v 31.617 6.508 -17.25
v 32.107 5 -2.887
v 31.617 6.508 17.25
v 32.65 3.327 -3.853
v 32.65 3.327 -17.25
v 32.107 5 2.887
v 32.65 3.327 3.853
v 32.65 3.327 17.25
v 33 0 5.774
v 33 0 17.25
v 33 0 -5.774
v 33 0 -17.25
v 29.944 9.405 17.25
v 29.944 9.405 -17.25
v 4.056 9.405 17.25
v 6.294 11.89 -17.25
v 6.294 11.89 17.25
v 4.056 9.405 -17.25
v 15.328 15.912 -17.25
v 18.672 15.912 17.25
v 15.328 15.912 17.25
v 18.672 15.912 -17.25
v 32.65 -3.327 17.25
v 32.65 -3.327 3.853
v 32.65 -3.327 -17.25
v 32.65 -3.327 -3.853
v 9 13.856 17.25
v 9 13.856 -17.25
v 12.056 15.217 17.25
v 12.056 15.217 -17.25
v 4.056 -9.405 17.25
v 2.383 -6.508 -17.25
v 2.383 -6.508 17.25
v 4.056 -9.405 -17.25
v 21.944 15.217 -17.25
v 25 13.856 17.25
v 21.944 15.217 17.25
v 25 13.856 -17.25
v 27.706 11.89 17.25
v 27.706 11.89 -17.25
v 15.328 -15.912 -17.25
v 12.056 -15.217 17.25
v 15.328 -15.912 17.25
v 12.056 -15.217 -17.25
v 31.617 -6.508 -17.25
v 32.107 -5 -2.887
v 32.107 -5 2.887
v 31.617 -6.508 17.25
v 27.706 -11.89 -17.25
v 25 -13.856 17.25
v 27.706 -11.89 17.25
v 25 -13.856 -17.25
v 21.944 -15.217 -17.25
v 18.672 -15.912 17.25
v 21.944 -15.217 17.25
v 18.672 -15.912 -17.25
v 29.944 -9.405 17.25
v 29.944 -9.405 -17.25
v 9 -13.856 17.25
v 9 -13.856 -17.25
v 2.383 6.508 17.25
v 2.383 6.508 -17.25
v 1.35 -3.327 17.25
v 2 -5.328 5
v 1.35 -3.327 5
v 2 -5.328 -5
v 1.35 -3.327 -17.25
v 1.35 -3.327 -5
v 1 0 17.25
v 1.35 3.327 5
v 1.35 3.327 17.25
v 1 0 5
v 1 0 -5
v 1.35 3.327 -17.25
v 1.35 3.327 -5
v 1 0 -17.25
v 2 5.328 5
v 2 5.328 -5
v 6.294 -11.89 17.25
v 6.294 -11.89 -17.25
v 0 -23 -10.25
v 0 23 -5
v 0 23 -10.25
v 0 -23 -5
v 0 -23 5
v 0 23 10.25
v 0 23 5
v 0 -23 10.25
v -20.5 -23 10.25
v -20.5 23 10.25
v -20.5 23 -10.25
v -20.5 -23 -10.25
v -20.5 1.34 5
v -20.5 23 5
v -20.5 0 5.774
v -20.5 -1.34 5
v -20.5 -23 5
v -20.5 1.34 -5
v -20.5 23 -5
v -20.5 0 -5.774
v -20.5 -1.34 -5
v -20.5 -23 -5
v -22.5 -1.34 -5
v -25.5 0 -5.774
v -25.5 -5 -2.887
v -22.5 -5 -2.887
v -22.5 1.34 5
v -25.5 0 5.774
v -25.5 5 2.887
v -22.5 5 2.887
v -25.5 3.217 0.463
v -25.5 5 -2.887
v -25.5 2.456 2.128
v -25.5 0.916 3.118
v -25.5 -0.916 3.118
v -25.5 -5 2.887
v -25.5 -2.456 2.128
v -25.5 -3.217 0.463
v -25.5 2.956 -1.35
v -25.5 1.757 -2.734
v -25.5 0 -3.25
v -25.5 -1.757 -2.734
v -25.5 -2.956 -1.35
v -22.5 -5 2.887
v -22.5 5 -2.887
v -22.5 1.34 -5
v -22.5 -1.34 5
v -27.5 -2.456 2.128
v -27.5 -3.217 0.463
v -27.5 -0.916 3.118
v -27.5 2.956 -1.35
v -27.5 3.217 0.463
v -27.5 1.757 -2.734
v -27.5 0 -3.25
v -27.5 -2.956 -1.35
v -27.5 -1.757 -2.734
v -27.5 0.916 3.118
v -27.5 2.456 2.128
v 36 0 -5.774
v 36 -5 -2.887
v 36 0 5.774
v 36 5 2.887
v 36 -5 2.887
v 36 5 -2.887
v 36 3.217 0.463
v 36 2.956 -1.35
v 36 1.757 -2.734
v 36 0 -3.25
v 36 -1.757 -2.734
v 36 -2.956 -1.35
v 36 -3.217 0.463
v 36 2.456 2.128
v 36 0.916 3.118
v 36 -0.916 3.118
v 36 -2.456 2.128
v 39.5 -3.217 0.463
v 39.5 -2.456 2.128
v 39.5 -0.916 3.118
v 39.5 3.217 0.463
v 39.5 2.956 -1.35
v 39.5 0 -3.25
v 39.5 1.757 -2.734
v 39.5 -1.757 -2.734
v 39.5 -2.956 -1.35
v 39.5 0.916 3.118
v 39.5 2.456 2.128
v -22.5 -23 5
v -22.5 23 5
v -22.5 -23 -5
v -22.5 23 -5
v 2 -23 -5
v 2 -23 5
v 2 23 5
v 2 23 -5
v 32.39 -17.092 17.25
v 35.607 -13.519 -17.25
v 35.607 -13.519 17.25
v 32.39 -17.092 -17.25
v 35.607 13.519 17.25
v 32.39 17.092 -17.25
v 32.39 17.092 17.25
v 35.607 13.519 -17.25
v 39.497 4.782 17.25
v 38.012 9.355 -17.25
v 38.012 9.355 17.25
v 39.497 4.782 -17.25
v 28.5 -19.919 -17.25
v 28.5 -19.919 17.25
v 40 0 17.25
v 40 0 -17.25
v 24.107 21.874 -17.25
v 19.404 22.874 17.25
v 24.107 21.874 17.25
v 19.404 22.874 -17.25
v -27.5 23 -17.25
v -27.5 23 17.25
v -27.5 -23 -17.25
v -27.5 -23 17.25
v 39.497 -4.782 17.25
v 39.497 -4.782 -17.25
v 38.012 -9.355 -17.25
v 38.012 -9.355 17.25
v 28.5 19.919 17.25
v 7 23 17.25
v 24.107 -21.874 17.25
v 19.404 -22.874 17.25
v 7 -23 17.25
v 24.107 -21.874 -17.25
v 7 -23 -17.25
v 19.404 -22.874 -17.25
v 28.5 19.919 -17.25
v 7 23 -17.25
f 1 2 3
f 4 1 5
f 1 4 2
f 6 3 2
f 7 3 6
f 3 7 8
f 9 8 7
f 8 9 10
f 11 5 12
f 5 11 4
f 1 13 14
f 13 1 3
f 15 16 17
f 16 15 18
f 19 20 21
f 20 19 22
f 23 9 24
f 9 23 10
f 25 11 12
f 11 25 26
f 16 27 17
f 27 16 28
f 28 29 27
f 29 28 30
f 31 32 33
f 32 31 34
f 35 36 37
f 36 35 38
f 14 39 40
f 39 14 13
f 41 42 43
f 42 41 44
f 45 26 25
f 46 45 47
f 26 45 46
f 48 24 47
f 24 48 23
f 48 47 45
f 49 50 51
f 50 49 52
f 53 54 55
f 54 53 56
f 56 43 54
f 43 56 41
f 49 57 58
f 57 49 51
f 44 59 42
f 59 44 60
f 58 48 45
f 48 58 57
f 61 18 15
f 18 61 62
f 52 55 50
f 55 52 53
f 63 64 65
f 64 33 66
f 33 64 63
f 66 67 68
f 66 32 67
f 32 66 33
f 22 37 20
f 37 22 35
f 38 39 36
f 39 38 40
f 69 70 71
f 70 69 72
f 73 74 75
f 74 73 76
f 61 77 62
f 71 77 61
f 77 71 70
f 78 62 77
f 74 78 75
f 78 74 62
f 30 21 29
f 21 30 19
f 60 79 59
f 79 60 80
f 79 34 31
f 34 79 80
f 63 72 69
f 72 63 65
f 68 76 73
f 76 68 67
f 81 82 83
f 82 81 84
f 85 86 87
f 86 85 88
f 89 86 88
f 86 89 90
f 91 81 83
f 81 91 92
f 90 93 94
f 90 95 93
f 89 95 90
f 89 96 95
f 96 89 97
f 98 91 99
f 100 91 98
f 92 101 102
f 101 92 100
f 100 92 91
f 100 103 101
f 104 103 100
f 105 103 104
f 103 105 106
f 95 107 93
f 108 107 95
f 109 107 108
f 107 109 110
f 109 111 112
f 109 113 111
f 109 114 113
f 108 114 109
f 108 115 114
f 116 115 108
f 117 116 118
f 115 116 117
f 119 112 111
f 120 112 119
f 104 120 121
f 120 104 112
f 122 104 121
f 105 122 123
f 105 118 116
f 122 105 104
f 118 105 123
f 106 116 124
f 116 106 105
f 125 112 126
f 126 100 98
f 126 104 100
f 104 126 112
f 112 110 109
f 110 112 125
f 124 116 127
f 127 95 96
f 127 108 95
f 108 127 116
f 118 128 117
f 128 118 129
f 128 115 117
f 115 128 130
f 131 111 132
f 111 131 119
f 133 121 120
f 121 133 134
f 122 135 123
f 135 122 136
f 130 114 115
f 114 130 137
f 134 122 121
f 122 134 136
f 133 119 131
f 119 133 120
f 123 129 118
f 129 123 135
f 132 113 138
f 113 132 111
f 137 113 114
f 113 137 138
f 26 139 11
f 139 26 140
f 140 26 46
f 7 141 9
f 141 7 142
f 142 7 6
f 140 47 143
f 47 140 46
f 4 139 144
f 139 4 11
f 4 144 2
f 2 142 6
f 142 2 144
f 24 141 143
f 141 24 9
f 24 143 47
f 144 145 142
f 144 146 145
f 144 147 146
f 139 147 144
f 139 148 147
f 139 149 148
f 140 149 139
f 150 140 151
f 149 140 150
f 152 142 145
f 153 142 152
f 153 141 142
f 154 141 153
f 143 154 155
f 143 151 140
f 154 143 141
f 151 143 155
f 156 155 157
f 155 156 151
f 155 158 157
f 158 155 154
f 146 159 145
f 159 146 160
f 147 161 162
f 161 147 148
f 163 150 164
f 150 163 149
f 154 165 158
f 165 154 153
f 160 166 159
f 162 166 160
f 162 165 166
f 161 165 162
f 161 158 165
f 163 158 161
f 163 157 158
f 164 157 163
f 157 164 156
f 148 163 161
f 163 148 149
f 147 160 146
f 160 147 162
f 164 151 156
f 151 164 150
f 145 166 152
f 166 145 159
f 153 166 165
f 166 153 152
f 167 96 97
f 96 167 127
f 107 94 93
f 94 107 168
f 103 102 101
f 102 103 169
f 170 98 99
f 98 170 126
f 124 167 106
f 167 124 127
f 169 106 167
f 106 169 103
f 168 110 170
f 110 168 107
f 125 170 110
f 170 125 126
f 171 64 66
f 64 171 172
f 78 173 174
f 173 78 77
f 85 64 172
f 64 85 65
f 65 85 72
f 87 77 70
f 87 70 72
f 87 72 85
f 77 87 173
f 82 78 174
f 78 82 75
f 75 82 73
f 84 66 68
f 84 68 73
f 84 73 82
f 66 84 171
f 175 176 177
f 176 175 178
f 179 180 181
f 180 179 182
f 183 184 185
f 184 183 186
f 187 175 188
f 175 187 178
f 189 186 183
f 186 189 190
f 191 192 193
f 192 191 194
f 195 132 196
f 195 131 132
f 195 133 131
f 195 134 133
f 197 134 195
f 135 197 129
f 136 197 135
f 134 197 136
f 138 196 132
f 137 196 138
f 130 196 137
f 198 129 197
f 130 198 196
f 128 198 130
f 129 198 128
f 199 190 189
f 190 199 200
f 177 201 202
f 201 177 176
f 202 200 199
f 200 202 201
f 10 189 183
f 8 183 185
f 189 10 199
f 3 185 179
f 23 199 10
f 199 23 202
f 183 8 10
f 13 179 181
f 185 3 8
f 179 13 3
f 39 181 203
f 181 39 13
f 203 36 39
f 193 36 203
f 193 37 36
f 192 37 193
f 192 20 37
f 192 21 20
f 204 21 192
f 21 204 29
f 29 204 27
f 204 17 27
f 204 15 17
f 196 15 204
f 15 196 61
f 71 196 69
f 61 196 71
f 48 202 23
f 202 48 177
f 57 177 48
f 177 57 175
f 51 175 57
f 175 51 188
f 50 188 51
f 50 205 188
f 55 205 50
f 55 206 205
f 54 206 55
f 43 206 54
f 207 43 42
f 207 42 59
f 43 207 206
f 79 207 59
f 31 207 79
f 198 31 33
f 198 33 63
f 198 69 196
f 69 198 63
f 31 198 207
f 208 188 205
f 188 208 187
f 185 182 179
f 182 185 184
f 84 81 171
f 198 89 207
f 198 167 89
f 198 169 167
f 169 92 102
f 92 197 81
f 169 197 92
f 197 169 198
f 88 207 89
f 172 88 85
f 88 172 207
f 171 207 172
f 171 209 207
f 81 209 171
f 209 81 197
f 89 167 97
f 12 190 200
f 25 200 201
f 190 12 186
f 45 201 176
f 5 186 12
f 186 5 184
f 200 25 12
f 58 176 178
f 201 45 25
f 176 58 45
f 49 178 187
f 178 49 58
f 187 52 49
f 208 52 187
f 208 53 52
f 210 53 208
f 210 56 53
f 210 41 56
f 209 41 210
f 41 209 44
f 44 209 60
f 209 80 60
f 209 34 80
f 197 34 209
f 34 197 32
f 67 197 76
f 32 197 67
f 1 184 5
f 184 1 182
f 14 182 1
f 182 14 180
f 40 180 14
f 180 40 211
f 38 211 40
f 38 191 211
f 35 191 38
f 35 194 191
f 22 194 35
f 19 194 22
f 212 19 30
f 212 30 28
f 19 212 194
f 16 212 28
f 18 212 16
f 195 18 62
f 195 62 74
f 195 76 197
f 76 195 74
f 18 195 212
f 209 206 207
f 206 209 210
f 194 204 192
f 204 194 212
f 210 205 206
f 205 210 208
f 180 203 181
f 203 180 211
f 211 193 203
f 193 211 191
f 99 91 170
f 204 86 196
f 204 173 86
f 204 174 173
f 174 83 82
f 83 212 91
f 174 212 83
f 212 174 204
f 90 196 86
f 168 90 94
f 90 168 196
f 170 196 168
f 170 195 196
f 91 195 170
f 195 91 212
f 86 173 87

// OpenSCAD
// file: data-access.scad
// Norm Nuts and Bolts - a OpenSCAD library
// Copyright (C) 2012  Johannes Kneer

// This program is free software: you can redistribute it and/or modify
// it under the terms of the GNU General Public License as published by
// the Free Software Foundation, either version 3 of the License, or
// (at your option) any later version.

// This program is distributed in the hope that it will be useful,
// but WITHOUT ANY WARRANTY; without even the implied warranty of
// MERCHANTABILITY or FITNESS FOR A PARTICULAR PURPOSE.  See the
// GNU General Public License for more details.

// You should have received a copy of the GNU General Public License
// along with this program.  If not, see <http://www.gnu.org/licenses/>.


// DATABASE ACCESS FUNCTIONS AND CONSTANTS



// == CONSTANTS ==

// screw table access keys
_NB_S_DESC            = 0;
_NB_S_FAMKEY			    = 1;
_NB_S_LENGTH          = 2;
_NB_S_NOTHREAD_LENGTH = 3;

_NB_F_DESC			      = 0;
_NB_F_OUTER_DIA       = 1;
_NB_F_INNER_DIA       = 2;
_NB_F_LEAD            = 3;
_NB_F_KEY             = 4;
_NB_F_KEY_DEPTH       = 5;
_NB_F_HEAD_HEIGHT     = 6;
_NB_F_HEAD_DIA        = 7;
_NB_F_NUT_KEY         = 8;
_NB_F_NUT_HEIGHT      = 9;
_NB_F_PITCH_FINE      = 10;
_NB_F_PITCH_MEDIUM    = 11;
_NB_F_PITCH_COARSE    = 12;


// == FUNCTIONS ==

// _get_screw("descriptor")   with descriptor = M8x25
//   find the line for a general object in the data matrix

function _get_screw(n) = data_screw[search([n], data_screw)[0]];
function _get_screw_fam(n) = data_screw_fam[search([_get_screw(n)[_NB_S_FAMKEY]], data_screw_fam)[0]];

function _get_fam(n) = data_screw_fam[search([n], data_screw_fam)[0]];


// _get_XXXXX("descriptor") functions
// find a single property in the database

function _get_desc(n)        = _get_screw(n)[_NB_S_DESC];
function _get_famkey(n)         = _get_screw(n)[_NB_S_FAMKEY];
function _get_length(n)      = _get_screw(n)[_NB_S_LENGTH];
function _get_nt_length(n)   = _get_screw(n)[_NB_S_NOTHREAD_LENGTH];

function _get_outer_dia(n)   = _get_screw_fam(n)[_NB_F_OUTER_DIA];
function _get_inner_dia(n)   = _get_screw_fam(n)[_NB_F_INNER_DIA];
function _get_lead(n)        = _get_screw_fam(n)[_NB_F_LEAD];
function _get_head_height(n) = _get_screw_fam(n)[_NB_F_HEAD_HEIGHT];
function _get_head_dia(n)    = _get_screw_fam(n)[_NB_F_HEAD_DIA];
function _get_nut_key(n)     = _get_screw_fam(n)[_NB_F_NUT_KEY];
function _get_nut_height(n)  = _get_screw_fam(n)[_NB_F_NUT_HEIGHT];
function _get_fine_pitch(n)  = _get_screw_fam(n)[_NB_F_PITCH_FINE];
function _get_medium_pitch(n)  = _get_screw_fam(n)[_NB_F_PITCH_MEDIUM];
function _get_coarse_pitch(n)  = _get_screw_fam(n)[_NB_F_PITCH_COARSE];
// main file
// SatNOGS Yagi v2 Axis mount

//$fn = 20;

include <cyl_head_bolt.scad>;

// Variables

axis = 32; //Axis diameter
mast = 20.5; //Yagi width
w = 7; 	  //Mount wall width

module mount_outer(){
	union(){
		translate([axis/2+1,0,0])
			cylinder(d=axis+2*w,h=mast+2*w,center=true);
		translate([-mast/2,0,0])
			cube([mast+2*w,axis+2*w,mast+2*w],center=true);
	}
}

module mount_inner(){
	union(){
		translate([axis/2+1,0,0])
			cylinder(d=axis,h=mast+2*w+1,center=true);
		translate([-mast/2,0,0])
			cube([mast,axis+2*w+1,mast],center=true);
	}
}

module nutsbolts(){
	translate([-mast+1,0,0])
		rotate([0,90,0])
			nutcatch_parallel("M6", l=6);
	translate([-mast,0,0])
		rotate([0,90,0])
			cylinder(r=3.25,h=15,center=true);
	translate([axis+4,0,0])
		rotate([0,90,0])
			nutcatch_parallel("M6", l=8);
	translate([axis,0,0])
		rotate([0,90,0])
			cylinder(r=3.25,h=15,center=true);
}

module nipple_rail(){
	translate([-mast,0,0])
		cube([4,axis+2*w+1,10],center=true);
	cube([4,axis+2*w+1,10],center=true);
}

difference() {
	hull() {
		mount_outer();
	}
	mount_inner();
	nutsbolts();
	nipple_rail();
}
